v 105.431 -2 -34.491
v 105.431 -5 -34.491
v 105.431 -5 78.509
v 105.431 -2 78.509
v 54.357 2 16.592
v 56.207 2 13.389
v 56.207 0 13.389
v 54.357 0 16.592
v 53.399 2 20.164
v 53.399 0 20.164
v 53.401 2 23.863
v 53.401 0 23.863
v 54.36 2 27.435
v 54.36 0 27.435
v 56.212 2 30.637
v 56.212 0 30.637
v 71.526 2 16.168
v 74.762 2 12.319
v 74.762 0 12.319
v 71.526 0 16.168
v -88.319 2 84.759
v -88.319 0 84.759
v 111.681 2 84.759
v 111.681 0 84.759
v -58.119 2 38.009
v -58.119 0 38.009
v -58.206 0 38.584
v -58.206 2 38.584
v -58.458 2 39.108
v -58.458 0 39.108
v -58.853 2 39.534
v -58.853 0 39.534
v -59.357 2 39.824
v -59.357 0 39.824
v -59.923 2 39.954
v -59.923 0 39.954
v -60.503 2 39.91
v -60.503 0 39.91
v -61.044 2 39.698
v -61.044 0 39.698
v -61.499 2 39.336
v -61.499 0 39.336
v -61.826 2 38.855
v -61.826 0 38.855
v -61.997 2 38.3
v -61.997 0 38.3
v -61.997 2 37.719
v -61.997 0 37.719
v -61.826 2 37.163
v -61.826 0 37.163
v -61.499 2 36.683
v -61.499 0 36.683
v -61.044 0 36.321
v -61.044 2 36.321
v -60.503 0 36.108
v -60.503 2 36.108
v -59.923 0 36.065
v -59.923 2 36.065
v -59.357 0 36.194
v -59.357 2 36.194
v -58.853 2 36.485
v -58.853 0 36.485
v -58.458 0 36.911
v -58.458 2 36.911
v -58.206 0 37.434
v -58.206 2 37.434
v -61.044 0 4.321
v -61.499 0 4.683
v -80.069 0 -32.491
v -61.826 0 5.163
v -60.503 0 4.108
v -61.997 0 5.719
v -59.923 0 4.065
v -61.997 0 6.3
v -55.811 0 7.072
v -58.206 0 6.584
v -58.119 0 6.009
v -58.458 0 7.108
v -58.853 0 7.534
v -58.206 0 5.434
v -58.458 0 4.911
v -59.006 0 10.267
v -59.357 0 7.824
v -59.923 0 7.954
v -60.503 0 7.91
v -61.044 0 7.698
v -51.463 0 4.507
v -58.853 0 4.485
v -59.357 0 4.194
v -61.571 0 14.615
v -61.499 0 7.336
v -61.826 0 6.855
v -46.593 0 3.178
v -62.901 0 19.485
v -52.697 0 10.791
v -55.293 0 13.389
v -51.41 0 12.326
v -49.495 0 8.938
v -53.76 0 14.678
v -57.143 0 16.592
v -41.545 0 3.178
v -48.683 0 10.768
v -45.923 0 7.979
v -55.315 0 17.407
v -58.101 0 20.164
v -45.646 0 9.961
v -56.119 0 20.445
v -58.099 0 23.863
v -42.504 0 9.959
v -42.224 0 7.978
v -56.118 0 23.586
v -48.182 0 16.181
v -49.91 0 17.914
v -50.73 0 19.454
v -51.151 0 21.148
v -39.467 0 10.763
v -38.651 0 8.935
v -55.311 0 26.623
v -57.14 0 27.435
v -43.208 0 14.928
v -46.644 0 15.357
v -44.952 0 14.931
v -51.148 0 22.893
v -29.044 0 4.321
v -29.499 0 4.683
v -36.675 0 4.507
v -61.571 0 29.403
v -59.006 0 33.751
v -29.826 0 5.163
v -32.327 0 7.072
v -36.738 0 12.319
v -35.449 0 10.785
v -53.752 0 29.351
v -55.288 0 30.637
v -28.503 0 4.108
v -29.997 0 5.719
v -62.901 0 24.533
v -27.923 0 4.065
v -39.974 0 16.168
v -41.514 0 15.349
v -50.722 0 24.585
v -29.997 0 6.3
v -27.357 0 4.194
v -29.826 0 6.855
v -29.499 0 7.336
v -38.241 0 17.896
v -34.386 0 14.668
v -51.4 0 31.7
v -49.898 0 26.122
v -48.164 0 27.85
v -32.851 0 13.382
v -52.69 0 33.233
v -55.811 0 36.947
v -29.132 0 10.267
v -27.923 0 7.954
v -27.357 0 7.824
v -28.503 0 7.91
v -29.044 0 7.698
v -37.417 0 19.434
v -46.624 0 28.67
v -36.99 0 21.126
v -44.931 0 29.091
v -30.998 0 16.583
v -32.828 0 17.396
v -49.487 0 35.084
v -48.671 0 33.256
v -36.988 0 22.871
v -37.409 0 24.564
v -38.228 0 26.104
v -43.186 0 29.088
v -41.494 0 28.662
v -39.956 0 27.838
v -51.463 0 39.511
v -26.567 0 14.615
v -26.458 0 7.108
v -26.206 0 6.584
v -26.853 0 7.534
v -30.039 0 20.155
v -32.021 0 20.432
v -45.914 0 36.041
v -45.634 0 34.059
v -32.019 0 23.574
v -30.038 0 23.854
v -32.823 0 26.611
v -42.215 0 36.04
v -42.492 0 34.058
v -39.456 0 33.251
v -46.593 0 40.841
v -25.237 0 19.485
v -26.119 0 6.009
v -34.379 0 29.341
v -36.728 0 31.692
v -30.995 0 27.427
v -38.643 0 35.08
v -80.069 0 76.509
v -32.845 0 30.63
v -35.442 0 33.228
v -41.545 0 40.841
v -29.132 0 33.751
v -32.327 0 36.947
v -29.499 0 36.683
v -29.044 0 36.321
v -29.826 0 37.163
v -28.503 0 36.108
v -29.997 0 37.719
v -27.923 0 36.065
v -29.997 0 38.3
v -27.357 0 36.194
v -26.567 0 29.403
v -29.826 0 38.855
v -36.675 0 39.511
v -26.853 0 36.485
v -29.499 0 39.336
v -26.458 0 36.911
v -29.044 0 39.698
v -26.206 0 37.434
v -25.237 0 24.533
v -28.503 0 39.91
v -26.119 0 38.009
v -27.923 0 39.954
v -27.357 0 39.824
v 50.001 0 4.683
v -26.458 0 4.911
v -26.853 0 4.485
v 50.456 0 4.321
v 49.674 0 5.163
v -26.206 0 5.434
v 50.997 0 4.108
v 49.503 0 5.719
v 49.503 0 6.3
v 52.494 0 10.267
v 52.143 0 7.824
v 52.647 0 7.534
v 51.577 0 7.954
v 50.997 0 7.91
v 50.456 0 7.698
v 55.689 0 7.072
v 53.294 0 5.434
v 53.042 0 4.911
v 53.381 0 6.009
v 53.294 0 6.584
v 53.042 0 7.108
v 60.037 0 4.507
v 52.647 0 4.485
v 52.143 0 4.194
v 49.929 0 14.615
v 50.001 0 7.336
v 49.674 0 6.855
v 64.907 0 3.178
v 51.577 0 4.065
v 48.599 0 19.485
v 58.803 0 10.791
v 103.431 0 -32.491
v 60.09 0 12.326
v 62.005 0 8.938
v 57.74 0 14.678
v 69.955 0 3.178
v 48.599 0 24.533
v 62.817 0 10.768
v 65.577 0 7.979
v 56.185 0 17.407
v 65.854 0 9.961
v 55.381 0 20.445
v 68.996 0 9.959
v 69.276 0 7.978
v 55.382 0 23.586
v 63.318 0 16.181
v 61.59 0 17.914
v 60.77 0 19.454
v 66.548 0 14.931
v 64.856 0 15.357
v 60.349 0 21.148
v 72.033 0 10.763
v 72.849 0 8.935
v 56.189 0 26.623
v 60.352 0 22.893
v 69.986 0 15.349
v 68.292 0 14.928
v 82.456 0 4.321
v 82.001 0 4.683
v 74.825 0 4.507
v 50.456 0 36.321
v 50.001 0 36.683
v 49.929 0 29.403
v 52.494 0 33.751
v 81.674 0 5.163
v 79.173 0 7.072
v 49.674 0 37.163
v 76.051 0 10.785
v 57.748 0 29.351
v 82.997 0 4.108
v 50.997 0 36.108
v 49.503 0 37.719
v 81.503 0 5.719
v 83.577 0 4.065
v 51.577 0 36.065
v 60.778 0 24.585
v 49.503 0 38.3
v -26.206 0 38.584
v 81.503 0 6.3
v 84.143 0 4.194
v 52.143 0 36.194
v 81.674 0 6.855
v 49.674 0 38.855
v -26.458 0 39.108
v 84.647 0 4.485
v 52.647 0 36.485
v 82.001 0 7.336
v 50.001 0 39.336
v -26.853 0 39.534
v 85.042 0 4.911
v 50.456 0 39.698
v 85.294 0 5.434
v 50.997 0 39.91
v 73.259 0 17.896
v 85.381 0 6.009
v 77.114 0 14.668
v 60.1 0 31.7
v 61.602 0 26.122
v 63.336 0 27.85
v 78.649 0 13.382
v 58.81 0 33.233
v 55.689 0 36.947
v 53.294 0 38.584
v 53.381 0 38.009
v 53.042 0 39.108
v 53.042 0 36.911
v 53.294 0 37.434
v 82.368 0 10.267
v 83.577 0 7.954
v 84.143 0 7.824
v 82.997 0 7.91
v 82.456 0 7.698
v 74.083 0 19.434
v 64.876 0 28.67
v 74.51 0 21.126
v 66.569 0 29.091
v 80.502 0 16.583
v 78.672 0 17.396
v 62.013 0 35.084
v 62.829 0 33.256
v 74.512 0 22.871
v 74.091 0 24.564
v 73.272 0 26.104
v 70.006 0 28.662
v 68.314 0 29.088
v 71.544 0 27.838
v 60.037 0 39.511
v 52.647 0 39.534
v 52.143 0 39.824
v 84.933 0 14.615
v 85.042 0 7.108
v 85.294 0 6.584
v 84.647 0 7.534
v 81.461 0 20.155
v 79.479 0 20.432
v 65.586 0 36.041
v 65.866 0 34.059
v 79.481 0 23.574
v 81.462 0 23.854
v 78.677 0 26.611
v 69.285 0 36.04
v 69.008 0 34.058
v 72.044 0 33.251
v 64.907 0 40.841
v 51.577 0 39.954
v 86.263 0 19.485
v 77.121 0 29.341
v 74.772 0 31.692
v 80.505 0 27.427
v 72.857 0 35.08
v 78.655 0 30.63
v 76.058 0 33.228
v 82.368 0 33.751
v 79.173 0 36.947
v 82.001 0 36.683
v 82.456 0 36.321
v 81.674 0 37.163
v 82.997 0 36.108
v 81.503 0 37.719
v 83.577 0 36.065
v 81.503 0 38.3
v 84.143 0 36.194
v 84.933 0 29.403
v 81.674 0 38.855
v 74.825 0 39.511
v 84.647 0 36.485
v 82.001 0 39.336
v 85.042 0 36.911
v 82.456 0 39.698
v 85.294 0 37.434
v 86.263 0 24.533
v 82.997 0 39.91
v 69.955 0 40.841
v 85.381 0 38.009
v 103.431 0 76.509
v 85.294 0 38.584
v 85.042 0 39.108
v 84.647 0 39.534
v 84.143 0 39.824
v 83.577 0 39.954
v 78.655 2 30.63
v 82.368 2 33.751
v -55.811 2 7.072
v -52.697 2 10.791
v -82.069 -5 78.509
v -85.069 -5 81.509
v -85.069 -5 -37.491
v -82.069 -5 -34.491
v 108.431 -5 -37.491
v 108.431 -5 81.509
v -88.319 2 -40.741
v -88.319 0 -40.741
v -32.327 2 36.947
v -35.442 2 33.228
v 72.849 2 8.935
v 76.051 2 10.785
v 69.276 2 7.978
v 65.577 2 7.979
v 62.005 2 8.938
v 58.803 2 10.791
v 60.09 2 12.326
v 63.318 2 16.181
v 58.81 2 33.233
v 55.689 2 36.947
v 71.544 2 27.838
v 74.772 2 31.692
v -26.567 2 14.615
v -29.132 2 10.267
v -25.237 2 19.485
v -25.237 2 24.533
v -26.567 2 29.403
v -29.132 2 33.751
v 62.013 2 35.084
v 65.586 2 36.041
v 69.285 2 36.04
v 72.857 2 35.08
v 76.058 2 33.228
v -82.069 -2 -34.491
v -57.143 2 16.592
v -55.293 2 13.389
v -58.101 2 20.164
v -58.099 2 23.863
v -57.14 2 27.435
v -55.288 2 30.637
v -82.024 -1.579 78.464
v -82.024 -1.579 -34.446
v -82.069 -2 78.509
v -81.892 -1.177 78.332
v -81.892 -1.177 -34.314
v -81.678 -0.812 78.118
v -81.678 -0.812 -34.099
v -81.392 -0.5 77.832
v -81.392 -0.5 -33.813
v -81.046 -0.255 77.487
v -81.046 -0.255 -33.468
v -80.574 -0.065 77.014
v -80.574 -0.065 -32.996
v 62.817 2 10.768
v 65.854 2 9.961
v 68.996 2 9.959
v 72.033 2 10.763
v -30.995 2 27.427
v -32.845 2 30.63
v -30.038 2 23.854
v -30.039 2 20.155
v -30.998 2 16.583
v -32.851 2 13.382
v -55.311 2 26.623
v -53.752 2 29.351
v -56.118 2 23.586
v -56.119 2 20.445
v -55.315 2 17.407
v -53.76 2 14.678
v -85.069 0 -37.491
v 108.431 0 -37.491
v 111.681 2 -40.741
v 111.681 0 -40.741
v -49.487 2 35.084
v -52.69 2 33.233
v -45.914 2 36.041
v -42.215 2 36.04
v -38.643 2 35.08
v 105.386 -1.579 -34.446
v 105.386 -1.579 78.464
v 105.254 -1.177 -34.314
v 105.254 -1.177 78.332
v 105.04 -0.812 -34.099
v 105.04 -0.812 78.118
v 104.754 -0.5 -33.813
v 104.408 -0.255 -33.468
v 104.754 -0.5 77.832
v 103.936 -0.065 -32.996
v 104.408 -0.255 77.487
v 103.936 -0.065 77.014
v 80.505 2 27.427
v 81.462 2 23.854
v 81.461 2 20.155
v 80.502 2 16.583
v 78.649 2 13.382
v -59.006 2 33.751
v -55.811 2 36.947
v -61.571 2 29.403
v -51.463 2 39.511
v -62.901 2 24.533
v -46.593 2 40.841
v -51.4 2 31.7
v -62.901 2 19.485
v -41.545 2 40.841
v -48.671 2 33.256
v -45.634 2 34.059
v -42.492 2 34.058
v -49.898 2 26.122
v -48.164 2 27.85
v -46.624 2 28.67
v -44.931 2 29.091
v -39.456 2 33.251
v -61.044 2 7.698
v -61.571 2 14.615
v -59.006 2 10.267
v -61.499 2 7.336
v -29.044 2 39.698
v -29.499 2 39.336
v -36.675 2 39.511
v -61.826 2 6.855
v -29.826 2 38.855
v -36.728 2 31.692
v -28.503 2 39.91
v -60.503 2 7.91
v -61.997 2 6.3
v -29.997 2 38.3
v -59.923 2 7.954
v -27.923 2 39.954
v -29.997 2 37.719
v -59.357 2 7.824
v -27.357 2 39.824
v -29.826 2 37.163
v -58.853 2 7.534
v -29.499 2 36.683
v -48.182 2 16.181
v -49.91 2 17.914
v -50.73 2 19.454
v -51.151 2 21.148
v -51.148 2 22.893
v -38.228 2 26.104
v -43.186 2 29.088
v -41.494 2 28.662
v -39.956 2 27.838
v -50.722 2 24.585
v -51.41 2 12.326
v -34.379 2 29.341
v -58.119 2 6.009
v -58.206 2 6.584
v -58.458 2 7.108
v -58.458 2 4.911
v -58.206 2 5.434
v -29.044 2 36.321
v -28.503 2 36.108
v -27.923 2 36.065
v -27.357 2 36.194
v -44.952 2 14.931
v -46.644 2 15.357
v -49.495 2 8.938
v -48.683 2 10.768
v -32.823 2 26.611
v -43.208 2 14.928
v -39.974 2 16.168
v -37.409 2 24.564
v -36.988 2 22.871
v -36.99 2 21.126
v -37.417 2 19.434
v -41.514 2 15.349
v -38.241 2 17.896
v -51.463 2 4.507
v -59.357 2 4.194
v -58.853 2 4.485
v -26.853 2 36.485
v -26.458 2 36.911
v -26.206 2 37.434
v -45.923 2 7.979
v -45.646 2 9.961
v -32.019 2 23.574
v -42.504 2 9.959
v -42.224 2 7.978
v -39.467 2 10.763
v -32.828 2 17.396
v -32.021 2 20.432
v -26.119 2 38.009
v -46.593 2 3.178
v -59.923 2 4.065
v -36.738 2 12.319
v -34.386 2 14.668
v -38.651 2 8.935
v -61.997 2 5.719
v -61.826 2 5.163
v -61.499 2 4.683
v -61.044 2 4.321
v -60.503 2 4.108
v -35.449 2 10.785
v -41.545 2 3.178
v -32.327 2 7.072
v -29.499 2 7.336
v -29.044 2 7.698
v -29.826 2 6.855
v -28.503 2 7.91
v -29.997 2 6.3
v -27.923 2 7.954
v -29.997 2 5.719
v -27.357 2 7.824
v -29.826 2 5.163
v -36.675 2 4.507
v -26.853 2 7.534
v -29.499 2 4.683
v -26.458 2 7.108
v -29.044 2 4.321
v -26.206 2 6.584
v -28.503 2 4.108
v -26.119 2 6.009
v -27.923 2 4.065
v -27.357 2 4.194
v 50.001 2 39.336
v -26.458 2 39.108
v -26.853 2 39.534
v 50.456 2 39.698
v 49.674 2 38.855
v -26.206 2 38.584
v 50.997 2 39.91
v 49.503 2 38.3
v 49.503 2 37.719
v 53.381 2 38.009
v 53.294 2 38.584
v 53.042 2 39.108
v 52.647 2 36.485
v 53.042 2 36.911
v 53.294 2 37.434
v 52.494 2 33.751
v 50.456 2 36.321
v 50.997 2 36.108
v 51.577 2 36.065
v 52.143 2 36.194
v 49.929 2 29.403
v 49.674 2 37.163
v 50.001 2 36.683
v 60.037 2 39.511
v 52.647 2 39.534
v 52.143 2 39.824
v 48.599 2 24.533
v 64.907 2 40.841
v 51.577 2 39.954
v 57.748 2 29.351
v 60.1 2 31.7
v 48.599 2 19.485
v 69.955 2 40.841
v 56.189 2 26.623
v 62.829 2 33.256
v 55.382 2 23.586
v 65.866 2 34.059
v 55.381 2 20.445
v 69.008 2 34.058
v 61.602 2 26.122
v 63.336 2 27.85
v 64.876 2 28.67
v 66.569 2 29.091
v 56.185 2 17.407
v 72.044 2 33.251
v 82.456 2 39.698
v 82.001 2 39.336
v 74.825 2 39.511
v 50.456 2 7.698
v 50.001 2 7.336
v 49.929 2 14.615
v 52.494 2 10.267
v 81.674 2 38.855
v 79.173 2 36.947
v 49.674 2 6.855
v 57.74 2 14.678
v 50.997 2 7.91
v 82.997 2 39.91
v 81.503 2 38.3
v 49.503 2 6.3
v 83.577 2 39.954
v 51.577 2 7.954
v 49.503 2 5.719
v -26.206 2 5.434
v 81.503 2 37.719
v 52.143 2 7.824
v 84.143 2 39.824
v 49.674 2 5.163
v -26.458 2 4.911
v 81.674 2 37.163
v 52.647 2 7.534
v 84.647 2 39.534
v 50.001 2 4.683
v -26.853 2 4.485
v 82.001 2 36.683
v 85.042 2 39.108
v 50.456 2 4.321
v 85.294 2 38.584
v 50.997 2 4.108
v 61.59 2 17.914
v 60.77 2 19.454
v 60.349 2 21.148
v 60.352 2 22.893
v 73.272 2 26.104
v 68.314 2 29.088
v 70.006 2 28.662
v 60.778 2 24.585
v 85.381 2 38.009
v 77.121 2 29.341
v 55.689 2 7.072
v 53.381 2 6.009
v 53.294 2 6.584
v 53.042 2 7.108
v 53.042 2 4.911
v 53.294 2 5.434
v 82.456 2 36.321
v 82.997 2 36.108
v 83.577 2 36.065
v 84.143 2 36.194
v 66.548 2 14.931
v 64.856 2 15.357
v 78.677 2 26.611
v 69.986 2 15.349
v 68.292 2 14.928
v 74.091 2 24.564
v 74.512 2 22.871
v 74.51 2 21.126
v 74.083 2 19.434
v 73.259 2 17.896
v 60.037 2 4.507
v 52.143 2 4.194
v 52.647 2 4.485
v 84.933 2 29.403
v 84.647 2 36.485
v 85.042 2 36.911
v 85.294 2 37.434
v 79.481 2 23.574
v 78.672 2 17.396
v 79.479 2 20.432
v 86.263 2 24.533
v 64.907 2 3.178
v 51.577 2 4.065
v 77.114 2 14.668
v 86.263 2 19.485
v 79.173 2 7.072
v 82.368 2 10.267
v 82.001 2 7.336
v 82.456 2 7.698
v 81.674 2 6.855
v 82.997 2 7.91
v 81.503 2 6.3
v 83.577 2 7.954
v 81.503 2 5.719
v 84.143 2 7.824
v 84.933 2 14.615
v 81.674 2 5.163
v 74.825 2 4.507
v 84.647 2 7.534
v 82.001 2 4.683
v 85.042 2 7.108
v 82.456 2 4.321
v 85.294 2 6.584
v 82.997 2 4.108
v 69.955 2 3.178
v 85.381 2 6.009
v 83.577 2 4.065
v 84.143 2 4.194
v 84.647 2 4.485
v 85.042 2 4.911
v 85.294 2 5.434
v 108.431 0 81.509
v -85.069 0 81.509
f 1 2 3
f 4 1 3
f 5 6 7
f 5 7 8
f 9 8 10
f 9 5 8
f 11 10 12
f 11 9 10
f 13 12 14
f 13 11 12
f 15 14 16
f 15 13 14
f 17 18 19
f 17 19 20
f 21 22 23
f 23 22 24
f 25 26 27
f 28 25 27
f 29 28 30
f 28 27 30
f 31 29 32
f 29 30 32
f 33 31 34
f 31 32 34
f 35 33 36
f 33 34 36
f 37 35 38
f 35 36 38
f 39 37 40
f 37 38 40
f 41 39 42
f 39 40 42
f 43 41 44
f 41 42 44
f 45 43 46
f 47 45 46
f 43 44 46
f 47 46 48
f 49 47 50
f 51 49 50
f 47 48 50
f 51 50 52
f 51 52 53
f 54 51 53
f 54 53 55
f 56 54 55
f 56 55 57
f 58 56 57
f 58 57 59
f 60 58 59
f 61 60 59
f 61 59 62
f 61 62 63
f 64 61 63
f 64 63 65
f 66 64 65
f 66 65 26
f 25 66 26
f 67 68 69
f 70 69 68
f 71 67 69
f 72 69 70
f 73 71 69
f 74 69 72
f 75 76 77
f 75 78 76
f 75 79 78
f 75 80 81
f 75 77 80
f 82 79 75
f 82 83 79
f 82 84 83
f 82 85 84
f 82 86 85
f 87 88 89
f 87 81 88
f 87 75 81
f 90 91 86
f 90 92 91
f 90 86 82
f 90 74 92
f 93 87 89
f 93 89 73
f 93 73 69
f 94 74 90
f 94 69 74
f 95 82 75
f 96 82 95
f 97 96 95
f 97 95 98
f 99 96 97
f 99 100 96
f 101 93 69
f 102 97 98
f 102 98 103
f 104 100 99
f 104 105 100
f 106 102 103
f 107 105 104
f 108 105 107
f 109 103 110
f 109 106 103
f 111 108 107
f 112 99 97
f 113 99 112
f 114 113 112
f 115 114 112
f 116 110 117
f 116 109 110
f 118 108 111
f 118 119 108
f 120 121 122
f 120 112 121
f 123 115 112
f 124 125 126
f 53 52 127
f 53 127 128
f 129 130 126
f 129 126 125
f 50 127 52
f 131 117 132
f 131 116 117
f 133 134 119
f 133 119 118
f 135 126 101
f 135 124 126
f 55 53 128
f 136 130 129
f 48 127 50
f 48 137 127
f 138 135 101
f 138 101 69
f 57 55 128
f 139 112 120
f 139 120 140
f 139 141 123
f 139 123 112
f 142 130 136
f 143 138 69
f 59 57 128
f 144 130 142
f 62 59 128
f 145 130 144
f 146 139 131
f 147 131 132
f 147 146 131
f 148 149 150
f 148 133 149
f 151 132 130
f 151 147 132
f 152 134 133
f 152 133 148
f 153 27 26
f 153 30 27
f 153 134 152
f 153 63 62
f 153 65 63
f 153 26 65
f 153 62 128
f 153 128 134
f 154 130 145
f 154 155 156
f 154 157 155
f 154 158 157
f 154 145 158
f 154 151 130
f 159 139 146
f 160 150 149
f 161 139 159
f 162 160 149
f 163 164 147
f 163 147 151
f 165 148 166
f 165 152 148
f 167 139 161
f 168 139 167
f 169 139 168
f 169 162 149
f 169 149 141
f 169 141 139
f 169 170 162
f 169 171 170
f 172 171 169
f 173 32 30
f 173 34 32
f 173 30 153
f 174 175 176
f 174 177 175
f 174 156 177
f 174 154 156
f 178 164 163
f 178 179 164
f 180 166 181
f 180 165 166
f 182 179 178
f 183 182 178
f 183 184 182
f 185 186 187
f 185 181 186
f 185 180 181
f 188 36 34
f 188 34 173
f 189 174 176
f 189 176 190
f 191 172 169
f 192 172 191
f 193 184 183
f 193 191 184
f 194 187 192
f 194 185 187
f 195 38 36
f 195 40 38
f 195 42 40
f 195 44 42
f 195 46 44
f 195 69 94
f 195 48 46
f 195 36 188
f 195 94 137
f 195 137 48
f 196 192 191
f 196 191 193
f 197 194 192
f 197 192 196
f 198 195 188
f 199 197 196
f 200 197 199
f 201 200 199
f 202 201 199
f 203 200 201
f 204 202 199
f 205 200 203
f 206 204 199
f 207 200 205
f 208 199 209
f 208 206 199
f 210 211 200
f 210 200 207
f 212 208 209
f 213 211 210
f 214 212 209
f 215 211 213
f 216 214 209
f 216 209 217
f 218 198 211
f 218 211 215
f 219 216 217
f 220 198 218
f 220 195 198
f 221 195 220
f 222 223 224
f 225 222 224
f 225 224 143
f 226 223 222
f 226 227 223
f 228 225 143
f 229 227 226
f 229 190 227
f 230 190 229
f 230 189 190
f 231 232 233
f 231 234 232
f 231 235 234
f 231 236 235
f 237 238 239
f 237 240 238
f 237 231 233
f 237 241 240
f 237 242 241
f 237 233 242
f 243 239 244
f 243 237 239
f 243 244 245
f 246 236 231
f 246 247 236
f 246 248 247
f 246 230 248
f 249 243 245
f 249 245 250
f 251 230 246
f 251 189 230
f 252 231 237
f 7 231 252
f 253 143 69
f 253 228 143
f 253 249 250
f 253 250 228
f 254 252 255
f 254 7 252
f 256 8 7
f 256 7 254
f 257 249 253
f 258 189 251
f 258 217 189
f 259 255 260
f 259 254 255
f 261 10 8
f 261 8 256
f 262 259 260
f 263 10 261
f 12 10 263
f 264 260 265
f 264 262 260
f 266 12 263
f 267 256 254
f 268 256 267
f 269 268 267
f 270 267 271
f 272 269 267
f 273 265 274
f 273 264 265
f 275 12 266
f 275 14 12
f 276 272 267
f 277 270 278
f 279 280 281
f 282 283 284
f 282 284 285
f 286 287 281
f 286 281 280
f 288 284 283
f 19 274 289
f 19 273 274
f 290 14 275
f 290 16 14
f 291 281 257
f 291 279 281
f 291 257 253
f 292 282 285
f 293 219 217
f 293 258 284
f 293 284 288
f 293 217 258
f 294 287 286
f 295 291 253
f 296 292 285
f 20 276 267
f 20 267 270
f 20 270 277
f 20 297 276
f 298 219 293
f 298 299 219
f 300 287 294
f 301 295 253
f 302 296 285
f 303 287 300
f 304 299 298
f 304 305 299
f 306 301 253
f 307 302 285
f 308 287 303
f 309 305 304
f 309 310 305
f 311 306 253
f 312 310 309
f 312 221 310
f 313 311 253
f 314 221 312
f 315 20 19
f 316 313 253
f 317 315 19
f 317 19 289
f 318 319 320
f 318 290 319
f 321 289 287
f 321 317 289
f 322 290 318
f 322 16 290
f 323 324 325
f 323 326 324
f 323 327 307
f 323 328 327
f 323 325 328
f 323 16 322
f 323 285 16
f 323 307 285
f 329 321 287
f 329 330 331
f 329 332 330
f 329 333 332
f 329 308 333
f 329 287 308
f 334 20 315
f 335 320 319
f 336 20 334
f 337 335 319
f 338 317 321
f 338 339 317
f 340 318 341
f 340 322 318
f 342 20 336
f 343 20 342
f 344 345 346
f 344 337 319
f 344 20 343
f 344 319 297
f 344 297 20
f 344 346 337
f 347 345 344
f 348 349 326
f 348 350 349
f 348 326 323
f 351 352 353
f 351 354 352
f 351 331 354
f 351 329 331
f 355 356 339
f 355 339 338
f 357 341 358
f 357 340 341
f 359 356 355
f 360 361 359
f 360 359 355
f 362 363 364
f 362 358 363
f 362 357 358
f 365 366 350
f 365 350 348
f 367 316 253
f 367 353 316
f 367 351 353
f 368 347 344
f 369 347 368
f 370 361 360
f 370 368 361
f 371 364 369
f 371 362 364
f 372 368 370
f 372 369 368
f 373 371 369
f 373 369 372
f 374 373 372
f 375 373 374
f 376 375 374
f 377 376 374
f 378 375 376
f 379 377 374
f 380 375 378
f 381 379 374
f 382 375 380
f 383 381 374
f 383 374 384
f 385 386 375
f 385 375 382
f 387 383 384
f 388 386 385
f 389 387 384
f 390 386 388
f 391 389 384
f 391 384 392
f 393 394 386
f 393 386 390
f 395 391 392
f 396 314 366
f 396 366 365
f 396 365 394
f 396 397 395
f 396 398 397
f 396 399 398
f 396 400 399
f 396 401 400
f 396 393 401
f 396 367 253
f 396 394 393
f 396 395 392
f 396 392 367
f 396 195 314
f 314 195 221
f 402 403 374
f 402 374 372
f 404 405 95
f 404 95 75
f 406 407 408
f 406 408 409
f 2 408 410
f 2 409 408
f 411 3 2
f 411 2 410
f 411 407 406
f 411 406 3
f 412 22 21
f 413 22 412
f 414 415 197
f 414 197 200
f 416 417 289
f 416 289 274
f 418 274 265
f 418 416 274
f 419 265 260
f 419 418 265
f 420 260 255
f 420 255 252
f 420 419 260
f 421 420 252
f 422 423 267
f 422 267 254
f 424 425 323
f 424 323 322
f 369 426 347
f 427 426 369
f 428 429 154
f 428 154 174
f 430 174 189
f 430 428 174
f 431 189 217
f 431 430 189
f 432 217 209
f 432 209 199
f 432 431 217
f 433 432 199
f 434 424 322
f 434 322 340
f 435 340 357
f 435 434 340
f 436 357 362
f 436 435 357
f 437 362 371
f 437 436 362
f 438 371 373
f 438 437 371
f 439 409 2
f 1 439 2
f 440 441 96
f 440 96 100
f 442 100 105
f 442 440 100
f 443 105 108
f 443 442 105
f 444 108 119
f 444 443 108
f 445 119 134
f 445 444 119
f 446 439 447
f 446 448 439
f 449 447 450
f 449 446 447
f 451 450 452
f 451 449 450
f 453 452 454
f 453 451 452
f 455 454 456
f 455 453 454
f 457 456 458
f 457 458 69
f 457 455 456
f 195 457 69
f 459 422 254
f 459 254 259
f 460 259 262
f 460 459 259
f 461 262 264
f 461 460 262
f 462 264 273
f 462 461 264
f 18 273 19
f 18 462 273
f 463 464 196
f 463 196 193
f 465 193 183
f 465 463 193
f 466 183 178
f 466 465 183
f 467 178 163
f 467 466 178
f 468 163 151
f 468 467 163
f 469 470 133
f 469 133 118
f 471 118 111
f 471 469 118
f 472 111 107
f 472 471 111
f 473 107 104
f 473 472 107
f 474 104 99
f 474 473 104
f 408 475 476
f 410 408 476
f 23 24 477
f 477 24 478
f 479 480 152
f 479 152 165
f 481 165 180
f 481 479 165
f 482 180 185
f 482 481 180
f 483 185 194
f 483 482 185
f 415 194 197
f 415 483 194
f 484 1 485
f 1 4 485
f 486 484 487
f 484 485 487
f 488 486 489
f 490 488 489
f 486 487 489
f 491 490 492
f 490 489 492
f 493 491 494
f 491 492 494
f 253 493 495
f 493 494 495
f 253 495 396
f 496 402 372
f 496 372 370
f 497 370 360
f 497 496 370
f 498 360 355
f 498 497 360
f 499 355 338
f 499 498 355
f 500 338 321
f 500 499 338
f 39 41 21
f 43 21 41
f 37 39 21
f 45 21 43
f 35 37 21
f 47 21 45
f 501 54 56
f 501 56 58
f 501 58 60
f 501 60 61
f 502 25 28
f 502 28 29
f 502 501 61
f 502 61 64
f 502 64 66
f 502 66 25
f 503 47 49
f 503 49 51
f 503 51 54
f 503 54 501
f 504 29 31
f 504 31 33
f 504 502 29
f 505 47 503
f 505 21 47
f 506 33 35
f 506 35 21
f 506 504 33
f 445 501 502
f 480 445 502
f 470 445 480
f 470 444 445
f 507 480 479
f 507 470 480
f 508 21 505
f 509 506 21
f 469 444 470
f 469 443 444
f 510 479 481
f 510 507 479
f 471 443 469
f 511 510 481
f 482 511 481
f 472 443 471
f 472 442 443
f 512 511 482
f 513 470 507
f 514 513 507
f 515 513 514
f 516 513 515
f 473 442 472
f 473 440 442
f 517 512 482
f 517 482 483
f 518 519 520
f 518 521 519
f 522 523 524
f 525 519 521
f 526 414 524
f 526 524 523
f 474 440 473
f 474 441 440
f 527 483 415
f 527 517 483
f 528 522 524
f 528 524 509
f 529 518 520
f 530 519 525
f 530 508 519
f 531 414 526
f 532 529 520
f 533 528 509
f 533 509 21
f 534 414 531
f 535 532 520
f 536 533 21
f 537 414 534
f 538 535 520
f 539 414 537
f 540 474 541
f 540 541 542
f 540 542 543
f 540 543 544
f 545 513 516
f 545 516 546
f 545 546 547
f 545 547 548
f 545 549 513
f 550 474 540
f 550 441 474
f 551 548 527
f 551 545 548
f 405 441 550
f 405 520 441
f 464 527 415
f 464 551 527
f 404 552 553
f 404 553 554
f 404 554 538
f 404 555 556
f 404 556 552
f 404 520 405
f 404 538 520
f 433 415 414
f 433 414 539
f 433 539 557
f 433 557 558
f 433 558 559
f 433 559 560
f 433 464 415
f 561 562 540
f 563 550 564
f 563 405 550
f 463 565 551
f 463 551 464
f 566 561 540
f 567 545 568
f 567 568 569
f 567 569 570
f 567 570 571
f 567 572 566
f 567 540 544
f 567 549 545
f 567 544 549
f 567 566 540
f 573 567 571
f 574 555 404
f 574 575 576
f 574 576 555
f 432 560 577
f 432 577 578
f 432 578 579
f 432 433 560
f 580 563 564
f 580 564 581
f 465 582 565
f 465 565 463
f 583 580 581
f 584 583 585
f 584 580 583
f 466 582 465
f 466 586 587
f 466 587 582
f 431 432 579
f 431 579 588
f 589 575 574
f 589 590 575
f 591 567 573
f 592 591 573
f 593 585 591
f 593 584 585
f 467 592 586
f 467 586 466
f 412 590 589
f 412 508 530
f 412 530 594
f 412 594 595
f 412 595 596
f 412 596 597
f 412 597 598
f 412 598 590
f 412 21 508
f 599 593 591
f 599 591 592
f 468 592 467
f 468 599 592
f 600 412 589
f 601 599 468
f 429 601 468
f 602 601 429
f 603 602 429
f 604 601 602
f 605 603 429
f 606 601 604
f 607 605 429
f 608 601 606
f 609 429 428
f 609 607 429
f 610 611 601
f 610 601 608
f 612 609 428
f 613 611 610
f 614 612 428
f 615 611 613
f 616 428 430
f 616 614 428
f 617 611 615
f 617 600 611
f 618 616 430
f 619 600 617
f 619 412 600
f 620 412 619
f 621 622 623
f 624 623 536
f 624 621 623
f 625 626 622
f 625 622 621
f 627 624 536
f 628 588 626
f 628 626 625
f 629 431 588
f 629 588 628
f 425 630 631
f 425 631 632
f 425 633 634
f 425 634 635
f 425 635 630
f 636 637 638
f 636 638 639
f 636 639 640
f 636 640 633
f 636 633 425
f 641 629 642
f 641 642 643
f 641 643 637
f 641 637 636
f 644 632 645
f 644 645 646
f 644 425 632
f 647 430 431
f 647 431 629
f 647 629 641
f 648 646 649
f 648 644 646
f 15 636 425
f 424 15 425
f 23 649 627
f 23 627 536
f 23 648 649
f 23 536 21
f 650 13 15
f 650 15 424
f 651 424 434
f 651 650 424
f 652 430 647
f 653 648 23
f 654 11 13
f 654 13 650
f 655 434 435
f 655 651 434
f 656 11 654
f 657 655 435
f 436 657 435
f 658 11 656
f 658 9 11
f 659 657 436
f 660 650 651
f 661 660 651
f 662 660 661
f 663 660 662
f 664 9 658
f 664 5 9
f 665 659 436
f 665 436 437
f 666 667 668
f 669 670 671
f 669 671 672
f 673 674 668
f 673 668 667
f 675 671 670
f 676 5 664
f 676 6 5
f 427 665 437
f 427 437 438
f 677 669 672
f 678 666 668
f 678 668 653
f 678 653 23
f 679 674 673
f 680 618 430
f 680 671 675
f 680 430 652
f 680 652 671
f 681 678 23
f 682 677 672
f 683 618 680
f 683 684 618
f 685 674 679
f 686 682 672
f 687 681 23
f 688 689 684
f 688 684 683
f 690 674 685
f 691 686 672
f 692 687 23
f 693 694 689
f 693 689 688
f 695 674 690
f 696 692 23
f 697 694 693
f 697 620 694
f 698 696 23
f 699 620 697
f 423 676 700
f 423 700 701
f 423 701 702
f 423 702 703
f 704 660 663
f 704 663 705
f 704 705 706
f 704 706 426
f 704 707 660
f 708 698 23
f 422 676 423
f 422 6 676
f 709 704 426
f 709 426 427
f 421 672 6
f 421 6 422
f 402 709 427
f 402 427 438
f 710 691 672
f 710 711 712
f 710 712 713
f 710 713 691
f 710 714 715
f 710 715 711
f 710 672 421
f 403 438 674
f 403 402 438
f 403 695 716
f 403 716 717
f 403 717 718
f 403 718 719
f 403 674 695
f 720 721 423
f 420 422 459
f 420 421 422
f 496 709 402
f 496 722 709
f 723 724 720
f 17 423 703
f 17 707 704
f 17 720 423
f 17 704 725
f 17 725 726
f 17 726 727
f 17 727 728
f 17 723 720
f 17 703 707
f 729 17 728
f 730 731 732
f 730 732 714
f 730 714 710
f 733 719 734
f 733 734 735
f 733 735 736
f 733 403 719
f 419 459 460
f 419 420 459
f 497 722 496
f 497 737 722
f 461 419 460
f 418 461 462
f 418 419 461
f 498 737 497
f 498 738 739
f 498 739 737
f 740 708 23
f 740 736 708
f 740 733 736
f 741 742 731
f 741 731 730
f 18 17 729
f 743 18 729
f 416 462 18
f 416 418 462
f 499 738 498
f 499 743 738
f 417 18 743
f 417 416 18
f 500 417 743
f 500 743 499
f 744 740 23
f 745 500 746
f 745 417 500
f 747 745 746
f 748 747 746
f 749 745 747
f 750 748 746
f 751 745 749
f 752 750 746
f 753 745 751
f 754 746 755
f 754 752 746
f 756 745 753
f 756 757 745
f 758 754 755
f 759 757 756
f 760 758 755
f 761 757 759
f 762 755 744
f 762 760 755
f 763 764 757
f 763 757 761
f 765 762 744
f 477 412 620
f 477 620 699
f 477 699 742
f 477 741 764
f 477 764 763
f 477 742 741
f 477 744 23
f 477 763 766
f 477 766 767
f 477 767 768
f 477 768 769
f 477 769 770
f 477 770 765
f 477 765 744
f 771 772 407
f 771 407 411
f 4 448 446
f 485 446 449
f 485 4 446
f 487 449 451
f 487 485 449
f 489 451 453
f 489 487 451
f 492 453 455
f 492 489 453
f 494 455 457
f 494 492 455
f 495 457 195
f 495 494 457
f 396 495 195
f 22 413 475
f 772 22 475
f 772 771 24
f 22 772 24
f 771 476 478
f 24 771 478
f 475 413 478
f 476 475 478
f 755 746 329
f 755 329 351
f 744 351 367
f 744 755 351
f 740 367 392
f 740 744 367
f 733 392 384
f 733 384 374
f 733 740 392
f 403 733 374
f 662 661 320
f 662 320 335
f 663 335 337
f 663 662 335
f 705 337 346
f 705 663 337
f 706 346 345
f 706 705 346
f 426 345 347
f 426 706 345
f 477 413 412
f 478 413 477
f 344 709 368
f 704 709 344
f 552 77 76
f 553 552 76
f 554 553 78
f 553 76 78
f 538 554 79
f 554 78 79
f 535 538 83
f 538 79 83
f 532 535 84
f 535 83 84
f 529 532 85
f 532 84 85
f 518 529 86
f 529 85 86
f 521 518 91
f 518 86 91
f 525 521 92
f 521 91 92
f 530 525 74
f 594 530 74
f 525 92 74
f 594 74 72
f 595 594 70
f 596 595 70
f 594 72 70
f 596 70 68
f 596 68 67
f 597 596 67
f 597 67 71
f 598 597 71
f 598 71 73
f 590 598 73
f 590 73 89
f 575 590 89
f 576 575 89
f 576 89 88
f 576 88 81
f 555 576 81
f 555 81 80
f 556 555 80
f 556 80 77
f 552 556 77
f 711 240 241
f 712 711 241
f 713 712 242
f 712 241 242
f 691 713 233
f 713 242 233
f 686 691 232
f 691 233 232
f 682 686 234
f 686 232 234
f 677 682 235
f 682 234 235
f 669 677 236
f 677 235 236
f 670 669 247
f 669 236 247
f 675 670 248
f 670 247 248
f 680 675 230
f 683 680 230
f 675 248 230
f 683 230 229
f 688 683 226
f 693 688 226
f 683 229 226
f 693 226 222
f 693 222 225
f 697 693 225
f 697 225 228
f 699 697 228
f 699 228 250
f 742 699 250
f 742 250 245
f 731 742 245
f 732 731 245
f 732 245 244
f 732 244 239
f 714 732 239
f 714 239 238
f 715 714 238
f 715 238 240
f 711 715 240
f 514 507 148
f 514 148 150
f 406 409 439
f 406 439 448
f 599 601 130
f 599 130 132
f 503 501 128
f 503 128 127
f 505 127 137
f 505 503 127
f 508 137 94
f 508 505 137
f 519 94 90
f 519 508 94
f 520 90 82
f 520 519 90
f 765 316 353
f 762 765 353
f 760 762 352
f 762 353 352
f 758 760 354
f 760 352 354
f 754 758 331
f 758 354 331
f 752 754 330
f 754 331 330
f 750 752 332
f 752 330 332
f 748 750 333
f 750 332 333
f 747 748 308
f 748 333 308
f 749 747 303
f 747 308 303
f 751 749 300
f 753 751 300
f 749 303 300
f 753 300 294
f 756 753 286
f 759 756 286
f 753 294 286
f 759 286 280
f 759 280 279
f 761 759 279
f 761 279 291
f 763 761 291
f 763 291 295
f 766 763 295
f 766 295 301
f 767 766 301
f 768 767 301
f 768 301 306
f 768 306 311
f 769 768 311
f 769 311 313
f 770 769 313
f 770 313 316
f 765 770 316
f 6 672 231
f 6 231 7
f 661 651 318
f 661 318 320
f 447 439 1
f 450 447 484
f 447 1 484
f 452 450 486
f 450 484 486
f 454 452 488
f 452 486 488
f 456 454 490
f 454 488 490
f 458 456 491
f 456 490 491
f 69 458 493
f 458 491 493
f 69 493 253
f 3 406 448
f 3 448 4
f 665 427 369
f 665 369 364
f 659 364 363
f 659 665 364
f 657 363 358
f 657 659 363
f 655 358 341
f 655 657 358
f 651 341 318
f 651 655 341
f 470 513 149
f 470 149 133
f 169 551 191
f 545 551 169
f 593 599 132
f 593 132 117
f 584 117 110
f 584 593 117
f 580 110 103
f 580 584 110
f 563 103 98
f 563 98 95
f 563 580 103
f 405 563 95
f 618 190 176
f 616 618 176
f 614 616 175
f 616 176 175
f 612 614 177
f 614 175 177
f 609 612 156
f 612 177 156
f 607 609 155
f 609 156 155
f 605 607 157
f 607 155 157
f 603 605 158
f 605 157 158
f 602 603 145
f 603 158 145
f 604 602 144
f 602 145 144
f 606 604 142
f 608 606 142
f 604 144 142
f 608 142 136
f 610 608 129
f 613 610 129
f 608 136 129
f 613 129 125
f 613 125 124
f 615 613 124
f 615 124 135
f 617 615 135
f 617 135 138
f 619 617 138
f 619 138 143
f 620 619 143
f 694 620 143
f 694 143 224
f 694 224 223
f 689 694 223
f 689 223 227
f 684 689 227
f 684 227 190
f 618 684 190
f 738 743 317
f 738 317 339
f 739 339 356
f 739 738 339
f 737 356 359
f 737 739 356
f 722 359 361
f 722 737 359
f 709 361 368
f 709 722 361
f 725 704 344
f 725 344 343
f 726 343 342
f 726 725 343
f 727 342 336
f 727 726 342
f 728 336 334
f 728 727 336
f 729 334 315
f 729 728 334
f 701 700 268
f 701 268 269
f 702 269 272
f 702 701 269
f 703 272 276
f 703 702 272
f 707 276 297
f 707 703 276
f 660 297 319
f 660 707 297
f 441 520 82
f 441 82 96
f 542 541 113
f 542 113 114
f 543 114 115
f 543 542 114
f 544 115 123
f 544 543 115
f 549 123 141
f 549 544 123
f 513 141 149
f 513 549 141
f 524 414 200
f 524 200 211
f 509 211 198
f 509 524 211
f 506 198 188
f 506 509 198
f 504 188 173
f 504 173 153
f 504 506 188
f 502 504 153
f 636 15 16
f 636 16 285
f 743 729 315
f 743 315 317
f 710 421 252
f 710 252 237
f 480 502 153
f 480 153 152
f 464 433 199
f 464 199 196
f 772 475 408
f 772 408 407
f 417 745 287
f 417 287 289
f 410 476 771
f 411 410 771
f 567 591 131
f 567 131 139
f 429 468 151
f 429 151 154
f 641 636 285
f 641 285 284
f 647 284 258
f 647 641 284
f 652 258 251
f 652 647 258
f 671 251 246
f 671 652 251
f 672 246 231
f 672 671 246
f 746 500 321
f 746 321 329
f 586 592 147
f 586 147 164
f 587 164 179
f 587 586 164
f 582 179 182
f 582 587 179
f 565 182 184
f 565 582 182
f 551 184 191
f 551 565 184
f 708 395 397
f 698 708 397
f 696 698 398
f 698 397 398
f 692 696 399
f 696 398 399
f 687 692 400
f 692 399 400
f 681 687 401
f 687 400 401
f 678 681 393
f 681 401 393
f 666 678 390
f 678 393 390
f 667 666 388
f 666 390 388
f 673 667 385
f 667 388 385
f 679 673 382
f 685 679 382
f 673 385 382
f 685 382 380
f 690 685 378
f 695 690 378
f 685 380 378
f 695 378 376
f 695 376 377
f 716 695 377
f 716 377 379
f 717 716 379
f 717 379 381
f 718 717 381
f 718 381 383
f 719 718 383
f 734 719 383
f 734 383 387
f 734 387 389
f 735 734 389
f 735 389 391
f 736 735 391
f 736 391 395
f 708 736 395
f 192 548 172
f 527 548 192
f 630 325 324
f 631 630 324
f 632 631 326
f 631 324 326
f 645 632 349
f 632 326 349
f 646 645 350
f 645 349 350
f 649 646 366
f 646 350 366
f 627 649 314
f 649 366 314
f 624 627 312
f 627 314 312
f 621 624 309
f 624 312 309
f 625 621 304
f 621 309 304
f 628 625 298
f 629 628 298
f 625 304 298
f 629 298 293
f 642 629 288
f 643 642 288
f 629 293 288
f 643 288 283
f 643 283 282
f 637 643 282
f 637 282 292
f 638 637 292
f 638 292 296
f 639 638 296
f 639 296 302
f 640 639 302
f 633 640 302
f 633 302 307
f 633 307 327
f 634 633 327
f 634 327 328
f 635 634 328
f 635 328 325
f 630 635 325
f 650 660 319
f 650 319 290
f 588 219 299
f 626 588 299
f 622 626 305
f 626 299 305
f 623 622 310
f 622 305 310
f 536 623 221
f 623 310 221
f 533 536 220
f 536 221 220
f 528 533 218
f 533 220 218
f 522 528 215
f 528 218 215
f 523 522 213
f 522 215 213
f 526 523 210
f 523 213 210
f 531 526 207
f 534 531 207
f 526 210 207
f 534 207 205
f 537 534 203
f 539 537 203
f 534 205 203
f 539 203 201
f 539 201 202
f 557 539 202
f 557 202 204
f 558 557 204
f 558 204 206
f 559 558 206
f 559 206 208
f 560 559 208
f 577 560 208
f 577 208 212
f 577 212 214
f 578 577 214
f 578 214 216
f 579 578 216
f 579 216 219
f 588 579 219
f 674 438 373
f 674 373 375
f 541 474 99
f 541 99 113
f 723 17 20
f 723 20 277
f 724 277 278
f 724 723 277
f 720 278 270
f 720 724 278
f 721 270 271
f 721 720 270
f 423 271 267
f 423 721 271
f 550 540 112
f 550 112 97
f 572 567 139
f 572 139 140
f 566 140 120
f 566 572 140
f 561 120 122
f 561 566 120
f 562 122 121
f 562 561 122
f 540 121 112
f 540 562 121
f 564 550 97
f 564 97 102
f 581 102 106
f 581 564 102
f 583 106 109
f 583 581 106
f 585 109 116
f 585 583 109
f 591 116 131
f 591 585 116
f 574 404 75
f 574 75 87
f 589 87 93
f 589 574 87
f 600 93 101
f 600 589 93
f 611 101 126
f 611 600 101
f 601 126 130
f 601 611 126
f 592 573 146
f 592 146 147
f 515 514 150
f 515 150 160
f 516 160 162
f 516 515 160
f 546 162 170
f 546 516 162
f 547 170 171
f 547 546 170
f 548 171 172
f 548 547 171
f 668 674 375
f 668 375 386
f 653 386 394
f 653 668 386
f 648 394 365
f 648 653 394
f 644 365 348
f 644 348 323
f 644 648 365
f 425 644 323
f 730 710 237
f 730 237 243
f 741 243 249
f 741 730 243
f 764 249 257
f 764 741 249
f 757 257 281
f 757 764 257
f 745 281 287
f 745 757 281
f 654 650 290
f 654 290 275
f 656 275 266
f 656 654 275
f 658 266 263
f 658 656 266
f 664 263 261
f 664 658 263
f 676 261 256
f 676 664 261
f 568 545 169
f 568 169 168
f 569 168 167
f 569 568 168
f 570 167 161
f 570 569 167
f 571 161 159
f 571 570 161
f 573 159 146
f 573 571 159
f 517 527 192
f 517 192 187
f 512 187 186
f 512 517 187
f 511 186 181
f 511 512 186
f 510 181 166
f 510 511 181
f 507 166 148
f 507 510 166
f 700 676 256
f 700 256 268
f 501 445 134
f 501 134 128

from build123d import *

# Parameters (mm, degrees)
SKETCH1_W              = 200
SKETCH1_H              = 125.5
BOSS_EXTRUDE1_DEPTH    = 2
SKETCH2_W              = 193.5
SKETCH2_H              = 119
BOSS_EXTRUDE2_DEPTH    = 5
SKETCH3_W              = 187.5
SKETCH3_H              = 113
CUT_EXTRUDE1_DEPTH     = 5
FILLET1_R              = 2
M3_5_CLEARANCE_HOLE1_D = 3.9
CUT_EXTRUDE3_DEPTH     = 2
LPATTERN1_COUNT        = 2
LPATTERN1_PITCH        = 111.5


with BuildPart() as part:
    # Sketch1 → Boss-Extrude1 (new body)
    with BuildSketch(Plane(origin=(0, 0, 0), x_dir=(1, 0, 0), z_dir=(0, 1, 0))):
        with Locations((11.680911681, -22.009259259)):
            Rectangle(SKETCH1_W, SKETCH1_H)
    extrude(amount=BOSS_EXTRUDE1_DEPTH)

    # Sketch2 → Boss-Extrude2 (add)
    with BuildSketch(Plane.XZ):
        with Locations((11.680911681, 22.009259259)):
            Rectangle(SKETCH2_W, SKETCH2_H)
    extrude(amount=BOSS_EXTRUDE2_DEPTH)

    # Sketch3 → Cut-Extrude1 (cut)
    with BuildSketch(Plane.XZ.offset(5)):
        with Locations((11.680911681, 22.009259259)):
            Rectangle(SKETCH3_W, SKETCH3_H)
    extrude(amount=-CUT_EXTRUDE1_DEPTH, mode=Mode.SUBTRACT)

    # Fillet1
    fillet1_edges = [part.edges().sort_by_distance(p)[0] for p in [
        (105.430911681, 0, 22.009259259),
        (11.680911681, 0, -34.490740741),
        (-82.069088319, 0, 22.009259259),
        (11.680911681, 0, 78.509259259),
    ]]
    fillet(fillet1_edges, radius=FILLET1_R)

    # M3.5 Clearance Hole1 (through all)
    with Locations(Plane(origin=(0, 2, 0), x_dir=(-1, 0, 0), z_dir=(0, 1, 0))):
        with Locations((60.069088319, 38.009259259), (28.069088319, 38.009259259), (28.069088319, 6.009259259), (60.069088319, 6.009259259), (-51.430911681, 38.009259259), (-51.430911681, 6.009259259), (-83.430911681, 6.009259259), (-83.430911681, 38.009259259)):
            Hole(M3_5_CLEARANCE_HOLE1_D / 2)

    # Sketch9 → Cut-Extrude3 (cut)
    with BuildSketch(Plane(origin=(0, 2, 0), x_dir=(1, 0, 0), z_dir=(0, 1, 0))):
        with BuildLine():
            Line((-59.006386494, -10.267150282), (-55.293048336, -13.388835035))
            ThreePointArc((-55.293048336, -13.388835035), (-58.221436969, -22.013724686), (-55.287606174, -30.636764657))
            Line((-55.287606174, -30.636764657), (-59.006386494, -33.751368237))
            ThreePointArc((-59.006386494, -33.751368237), (-63.069088319, -22.009259259), (-59.006386494, -10.267150282))
        make_face()
        with BuildLine():
            Line((-53.75963561, -14.677926123), (-49.910160311, -17.914057022))
            ThreePointArc((-49.910160311, -17.914057022), (-51.202718747, -22.020227048), (-49.897540172, -26.122403114))
            Line((-49.897540172, -26.122403114), (-53.752014553, -29.350655033))
            ThreePointArc((-53.752014553, -29.350655033), (-56.220430324, -22.015570701), (-53.75963561, -14.677926123))
        make_face()
        with BuildLine():
            Line((-52.696593717, -10.790741404), (-55.811197297, -7.071961085))
            ThreePointArc((-55.811197297, -7.071961085), (-44.069088319, -3.009259259), (-32.326979341, -7.071961085))
            Line((-32.326979341, -7.071961085), (-35.448664095, -10.785299243))
            ThreePointArc((-35.448664095, -10.785299243), (-44.073553746, -7.856910609), (-52.696593717, -10.790741404))
        make_face()
        with BuildLine():
            Line((-48.182232174, -16.180807406), (-51.410484093, -12.326333025))
            ThreePointArc((-51.410484093, -12.326333025), (-44.075399761, -9.857917254), (-36.737755183, -12.318711968))
            Line((-36.737755183, -12.318711968), (-39.973886082, -16.168187268))
            ThreePointArc((-39.973886082, -16.168187268), (-44.080056108, -14.875628831), (-48.182232174, -16.180807406))
        make_face()
        with BuildLine():
            Line((-32.850570464, -13.381753861), (-29.131790144, -10.267150282))
            ThreePointArc((-29.131790144, -10.267150282), (-25.069088319, -22.009259259), (-29.131790144, -33.751368237))
            Line((-29.131790144, -33.751368237), (-32.845128303, -30.629683483))
            ThreePointArc((-32.845128303, -30.629683483), (-29.916739669, -22.004793832), (-32.850570464, -13.381753861))
        make_face()
        with BuildLine():
            Line((-38.240636466, -17.896115404), (-34.386162085, -14.667863485))
            ThreePointArc((-34.386162085, -14.667863485), (-31.917746314, -22.002947817), (-34.378541028, -29.340592396))
            Line((-34.378541028, -29.340592396), (-38.228016328, -26.104461496))
            ThreePointArc((-38.228016328, -26.104461496), (-36.935457891, -21.998291471), (-38.240636466, -17.896115404))
        make_face()
        with BuildLine():
            Line((-35.441582921, -33.227777114), (-32.326979341, -36.946557434))
            ThreePointArc((-32.326979341, -36.946557434), (-44.069088319, -41.009259259), (-55.811197297, -36.946557434))
            Line((-55.811197297, -36.946557434), (-52.689512543, -33.233219276))
            ThreePointArc((-52.689512543, -33.233219276), (-44.064622892, -36.161607909), (-35.441582921, -33.227777114))
        make_face()
        with BuildLine():
            Line((-39.955944464, -27.837711112), (-36.727692545, -31.692185493))
            ThreePointArc((-36.727692545, -31.692185493), (-44.062776877, -34.160601264), (-51.400421455, -31.69980655))
            Line((-51.400421455, -31.69980655), (-48.164290556, -27.850331251))
            ThreePointArc((-48.164290556, -27.850331251), (-44.058120531, -29.142889687), (-39.955944464, -27.837711112))
        make_face()
    cut_extrude3 = extrude(amount=-CUT_EXTRUDE3_DEPTH, mode=Mode.SUBTRACT)

    # LPattern1: Cut-Extrude3 ×2
    with Locations(*[(i * LPATTERN1_PITCH, 0, 0) for i in range(1, LPATTERN1_COUNT)]):
        add(cut_extrude3, mode=Mode.SUBTRACT)


solid = part.part
